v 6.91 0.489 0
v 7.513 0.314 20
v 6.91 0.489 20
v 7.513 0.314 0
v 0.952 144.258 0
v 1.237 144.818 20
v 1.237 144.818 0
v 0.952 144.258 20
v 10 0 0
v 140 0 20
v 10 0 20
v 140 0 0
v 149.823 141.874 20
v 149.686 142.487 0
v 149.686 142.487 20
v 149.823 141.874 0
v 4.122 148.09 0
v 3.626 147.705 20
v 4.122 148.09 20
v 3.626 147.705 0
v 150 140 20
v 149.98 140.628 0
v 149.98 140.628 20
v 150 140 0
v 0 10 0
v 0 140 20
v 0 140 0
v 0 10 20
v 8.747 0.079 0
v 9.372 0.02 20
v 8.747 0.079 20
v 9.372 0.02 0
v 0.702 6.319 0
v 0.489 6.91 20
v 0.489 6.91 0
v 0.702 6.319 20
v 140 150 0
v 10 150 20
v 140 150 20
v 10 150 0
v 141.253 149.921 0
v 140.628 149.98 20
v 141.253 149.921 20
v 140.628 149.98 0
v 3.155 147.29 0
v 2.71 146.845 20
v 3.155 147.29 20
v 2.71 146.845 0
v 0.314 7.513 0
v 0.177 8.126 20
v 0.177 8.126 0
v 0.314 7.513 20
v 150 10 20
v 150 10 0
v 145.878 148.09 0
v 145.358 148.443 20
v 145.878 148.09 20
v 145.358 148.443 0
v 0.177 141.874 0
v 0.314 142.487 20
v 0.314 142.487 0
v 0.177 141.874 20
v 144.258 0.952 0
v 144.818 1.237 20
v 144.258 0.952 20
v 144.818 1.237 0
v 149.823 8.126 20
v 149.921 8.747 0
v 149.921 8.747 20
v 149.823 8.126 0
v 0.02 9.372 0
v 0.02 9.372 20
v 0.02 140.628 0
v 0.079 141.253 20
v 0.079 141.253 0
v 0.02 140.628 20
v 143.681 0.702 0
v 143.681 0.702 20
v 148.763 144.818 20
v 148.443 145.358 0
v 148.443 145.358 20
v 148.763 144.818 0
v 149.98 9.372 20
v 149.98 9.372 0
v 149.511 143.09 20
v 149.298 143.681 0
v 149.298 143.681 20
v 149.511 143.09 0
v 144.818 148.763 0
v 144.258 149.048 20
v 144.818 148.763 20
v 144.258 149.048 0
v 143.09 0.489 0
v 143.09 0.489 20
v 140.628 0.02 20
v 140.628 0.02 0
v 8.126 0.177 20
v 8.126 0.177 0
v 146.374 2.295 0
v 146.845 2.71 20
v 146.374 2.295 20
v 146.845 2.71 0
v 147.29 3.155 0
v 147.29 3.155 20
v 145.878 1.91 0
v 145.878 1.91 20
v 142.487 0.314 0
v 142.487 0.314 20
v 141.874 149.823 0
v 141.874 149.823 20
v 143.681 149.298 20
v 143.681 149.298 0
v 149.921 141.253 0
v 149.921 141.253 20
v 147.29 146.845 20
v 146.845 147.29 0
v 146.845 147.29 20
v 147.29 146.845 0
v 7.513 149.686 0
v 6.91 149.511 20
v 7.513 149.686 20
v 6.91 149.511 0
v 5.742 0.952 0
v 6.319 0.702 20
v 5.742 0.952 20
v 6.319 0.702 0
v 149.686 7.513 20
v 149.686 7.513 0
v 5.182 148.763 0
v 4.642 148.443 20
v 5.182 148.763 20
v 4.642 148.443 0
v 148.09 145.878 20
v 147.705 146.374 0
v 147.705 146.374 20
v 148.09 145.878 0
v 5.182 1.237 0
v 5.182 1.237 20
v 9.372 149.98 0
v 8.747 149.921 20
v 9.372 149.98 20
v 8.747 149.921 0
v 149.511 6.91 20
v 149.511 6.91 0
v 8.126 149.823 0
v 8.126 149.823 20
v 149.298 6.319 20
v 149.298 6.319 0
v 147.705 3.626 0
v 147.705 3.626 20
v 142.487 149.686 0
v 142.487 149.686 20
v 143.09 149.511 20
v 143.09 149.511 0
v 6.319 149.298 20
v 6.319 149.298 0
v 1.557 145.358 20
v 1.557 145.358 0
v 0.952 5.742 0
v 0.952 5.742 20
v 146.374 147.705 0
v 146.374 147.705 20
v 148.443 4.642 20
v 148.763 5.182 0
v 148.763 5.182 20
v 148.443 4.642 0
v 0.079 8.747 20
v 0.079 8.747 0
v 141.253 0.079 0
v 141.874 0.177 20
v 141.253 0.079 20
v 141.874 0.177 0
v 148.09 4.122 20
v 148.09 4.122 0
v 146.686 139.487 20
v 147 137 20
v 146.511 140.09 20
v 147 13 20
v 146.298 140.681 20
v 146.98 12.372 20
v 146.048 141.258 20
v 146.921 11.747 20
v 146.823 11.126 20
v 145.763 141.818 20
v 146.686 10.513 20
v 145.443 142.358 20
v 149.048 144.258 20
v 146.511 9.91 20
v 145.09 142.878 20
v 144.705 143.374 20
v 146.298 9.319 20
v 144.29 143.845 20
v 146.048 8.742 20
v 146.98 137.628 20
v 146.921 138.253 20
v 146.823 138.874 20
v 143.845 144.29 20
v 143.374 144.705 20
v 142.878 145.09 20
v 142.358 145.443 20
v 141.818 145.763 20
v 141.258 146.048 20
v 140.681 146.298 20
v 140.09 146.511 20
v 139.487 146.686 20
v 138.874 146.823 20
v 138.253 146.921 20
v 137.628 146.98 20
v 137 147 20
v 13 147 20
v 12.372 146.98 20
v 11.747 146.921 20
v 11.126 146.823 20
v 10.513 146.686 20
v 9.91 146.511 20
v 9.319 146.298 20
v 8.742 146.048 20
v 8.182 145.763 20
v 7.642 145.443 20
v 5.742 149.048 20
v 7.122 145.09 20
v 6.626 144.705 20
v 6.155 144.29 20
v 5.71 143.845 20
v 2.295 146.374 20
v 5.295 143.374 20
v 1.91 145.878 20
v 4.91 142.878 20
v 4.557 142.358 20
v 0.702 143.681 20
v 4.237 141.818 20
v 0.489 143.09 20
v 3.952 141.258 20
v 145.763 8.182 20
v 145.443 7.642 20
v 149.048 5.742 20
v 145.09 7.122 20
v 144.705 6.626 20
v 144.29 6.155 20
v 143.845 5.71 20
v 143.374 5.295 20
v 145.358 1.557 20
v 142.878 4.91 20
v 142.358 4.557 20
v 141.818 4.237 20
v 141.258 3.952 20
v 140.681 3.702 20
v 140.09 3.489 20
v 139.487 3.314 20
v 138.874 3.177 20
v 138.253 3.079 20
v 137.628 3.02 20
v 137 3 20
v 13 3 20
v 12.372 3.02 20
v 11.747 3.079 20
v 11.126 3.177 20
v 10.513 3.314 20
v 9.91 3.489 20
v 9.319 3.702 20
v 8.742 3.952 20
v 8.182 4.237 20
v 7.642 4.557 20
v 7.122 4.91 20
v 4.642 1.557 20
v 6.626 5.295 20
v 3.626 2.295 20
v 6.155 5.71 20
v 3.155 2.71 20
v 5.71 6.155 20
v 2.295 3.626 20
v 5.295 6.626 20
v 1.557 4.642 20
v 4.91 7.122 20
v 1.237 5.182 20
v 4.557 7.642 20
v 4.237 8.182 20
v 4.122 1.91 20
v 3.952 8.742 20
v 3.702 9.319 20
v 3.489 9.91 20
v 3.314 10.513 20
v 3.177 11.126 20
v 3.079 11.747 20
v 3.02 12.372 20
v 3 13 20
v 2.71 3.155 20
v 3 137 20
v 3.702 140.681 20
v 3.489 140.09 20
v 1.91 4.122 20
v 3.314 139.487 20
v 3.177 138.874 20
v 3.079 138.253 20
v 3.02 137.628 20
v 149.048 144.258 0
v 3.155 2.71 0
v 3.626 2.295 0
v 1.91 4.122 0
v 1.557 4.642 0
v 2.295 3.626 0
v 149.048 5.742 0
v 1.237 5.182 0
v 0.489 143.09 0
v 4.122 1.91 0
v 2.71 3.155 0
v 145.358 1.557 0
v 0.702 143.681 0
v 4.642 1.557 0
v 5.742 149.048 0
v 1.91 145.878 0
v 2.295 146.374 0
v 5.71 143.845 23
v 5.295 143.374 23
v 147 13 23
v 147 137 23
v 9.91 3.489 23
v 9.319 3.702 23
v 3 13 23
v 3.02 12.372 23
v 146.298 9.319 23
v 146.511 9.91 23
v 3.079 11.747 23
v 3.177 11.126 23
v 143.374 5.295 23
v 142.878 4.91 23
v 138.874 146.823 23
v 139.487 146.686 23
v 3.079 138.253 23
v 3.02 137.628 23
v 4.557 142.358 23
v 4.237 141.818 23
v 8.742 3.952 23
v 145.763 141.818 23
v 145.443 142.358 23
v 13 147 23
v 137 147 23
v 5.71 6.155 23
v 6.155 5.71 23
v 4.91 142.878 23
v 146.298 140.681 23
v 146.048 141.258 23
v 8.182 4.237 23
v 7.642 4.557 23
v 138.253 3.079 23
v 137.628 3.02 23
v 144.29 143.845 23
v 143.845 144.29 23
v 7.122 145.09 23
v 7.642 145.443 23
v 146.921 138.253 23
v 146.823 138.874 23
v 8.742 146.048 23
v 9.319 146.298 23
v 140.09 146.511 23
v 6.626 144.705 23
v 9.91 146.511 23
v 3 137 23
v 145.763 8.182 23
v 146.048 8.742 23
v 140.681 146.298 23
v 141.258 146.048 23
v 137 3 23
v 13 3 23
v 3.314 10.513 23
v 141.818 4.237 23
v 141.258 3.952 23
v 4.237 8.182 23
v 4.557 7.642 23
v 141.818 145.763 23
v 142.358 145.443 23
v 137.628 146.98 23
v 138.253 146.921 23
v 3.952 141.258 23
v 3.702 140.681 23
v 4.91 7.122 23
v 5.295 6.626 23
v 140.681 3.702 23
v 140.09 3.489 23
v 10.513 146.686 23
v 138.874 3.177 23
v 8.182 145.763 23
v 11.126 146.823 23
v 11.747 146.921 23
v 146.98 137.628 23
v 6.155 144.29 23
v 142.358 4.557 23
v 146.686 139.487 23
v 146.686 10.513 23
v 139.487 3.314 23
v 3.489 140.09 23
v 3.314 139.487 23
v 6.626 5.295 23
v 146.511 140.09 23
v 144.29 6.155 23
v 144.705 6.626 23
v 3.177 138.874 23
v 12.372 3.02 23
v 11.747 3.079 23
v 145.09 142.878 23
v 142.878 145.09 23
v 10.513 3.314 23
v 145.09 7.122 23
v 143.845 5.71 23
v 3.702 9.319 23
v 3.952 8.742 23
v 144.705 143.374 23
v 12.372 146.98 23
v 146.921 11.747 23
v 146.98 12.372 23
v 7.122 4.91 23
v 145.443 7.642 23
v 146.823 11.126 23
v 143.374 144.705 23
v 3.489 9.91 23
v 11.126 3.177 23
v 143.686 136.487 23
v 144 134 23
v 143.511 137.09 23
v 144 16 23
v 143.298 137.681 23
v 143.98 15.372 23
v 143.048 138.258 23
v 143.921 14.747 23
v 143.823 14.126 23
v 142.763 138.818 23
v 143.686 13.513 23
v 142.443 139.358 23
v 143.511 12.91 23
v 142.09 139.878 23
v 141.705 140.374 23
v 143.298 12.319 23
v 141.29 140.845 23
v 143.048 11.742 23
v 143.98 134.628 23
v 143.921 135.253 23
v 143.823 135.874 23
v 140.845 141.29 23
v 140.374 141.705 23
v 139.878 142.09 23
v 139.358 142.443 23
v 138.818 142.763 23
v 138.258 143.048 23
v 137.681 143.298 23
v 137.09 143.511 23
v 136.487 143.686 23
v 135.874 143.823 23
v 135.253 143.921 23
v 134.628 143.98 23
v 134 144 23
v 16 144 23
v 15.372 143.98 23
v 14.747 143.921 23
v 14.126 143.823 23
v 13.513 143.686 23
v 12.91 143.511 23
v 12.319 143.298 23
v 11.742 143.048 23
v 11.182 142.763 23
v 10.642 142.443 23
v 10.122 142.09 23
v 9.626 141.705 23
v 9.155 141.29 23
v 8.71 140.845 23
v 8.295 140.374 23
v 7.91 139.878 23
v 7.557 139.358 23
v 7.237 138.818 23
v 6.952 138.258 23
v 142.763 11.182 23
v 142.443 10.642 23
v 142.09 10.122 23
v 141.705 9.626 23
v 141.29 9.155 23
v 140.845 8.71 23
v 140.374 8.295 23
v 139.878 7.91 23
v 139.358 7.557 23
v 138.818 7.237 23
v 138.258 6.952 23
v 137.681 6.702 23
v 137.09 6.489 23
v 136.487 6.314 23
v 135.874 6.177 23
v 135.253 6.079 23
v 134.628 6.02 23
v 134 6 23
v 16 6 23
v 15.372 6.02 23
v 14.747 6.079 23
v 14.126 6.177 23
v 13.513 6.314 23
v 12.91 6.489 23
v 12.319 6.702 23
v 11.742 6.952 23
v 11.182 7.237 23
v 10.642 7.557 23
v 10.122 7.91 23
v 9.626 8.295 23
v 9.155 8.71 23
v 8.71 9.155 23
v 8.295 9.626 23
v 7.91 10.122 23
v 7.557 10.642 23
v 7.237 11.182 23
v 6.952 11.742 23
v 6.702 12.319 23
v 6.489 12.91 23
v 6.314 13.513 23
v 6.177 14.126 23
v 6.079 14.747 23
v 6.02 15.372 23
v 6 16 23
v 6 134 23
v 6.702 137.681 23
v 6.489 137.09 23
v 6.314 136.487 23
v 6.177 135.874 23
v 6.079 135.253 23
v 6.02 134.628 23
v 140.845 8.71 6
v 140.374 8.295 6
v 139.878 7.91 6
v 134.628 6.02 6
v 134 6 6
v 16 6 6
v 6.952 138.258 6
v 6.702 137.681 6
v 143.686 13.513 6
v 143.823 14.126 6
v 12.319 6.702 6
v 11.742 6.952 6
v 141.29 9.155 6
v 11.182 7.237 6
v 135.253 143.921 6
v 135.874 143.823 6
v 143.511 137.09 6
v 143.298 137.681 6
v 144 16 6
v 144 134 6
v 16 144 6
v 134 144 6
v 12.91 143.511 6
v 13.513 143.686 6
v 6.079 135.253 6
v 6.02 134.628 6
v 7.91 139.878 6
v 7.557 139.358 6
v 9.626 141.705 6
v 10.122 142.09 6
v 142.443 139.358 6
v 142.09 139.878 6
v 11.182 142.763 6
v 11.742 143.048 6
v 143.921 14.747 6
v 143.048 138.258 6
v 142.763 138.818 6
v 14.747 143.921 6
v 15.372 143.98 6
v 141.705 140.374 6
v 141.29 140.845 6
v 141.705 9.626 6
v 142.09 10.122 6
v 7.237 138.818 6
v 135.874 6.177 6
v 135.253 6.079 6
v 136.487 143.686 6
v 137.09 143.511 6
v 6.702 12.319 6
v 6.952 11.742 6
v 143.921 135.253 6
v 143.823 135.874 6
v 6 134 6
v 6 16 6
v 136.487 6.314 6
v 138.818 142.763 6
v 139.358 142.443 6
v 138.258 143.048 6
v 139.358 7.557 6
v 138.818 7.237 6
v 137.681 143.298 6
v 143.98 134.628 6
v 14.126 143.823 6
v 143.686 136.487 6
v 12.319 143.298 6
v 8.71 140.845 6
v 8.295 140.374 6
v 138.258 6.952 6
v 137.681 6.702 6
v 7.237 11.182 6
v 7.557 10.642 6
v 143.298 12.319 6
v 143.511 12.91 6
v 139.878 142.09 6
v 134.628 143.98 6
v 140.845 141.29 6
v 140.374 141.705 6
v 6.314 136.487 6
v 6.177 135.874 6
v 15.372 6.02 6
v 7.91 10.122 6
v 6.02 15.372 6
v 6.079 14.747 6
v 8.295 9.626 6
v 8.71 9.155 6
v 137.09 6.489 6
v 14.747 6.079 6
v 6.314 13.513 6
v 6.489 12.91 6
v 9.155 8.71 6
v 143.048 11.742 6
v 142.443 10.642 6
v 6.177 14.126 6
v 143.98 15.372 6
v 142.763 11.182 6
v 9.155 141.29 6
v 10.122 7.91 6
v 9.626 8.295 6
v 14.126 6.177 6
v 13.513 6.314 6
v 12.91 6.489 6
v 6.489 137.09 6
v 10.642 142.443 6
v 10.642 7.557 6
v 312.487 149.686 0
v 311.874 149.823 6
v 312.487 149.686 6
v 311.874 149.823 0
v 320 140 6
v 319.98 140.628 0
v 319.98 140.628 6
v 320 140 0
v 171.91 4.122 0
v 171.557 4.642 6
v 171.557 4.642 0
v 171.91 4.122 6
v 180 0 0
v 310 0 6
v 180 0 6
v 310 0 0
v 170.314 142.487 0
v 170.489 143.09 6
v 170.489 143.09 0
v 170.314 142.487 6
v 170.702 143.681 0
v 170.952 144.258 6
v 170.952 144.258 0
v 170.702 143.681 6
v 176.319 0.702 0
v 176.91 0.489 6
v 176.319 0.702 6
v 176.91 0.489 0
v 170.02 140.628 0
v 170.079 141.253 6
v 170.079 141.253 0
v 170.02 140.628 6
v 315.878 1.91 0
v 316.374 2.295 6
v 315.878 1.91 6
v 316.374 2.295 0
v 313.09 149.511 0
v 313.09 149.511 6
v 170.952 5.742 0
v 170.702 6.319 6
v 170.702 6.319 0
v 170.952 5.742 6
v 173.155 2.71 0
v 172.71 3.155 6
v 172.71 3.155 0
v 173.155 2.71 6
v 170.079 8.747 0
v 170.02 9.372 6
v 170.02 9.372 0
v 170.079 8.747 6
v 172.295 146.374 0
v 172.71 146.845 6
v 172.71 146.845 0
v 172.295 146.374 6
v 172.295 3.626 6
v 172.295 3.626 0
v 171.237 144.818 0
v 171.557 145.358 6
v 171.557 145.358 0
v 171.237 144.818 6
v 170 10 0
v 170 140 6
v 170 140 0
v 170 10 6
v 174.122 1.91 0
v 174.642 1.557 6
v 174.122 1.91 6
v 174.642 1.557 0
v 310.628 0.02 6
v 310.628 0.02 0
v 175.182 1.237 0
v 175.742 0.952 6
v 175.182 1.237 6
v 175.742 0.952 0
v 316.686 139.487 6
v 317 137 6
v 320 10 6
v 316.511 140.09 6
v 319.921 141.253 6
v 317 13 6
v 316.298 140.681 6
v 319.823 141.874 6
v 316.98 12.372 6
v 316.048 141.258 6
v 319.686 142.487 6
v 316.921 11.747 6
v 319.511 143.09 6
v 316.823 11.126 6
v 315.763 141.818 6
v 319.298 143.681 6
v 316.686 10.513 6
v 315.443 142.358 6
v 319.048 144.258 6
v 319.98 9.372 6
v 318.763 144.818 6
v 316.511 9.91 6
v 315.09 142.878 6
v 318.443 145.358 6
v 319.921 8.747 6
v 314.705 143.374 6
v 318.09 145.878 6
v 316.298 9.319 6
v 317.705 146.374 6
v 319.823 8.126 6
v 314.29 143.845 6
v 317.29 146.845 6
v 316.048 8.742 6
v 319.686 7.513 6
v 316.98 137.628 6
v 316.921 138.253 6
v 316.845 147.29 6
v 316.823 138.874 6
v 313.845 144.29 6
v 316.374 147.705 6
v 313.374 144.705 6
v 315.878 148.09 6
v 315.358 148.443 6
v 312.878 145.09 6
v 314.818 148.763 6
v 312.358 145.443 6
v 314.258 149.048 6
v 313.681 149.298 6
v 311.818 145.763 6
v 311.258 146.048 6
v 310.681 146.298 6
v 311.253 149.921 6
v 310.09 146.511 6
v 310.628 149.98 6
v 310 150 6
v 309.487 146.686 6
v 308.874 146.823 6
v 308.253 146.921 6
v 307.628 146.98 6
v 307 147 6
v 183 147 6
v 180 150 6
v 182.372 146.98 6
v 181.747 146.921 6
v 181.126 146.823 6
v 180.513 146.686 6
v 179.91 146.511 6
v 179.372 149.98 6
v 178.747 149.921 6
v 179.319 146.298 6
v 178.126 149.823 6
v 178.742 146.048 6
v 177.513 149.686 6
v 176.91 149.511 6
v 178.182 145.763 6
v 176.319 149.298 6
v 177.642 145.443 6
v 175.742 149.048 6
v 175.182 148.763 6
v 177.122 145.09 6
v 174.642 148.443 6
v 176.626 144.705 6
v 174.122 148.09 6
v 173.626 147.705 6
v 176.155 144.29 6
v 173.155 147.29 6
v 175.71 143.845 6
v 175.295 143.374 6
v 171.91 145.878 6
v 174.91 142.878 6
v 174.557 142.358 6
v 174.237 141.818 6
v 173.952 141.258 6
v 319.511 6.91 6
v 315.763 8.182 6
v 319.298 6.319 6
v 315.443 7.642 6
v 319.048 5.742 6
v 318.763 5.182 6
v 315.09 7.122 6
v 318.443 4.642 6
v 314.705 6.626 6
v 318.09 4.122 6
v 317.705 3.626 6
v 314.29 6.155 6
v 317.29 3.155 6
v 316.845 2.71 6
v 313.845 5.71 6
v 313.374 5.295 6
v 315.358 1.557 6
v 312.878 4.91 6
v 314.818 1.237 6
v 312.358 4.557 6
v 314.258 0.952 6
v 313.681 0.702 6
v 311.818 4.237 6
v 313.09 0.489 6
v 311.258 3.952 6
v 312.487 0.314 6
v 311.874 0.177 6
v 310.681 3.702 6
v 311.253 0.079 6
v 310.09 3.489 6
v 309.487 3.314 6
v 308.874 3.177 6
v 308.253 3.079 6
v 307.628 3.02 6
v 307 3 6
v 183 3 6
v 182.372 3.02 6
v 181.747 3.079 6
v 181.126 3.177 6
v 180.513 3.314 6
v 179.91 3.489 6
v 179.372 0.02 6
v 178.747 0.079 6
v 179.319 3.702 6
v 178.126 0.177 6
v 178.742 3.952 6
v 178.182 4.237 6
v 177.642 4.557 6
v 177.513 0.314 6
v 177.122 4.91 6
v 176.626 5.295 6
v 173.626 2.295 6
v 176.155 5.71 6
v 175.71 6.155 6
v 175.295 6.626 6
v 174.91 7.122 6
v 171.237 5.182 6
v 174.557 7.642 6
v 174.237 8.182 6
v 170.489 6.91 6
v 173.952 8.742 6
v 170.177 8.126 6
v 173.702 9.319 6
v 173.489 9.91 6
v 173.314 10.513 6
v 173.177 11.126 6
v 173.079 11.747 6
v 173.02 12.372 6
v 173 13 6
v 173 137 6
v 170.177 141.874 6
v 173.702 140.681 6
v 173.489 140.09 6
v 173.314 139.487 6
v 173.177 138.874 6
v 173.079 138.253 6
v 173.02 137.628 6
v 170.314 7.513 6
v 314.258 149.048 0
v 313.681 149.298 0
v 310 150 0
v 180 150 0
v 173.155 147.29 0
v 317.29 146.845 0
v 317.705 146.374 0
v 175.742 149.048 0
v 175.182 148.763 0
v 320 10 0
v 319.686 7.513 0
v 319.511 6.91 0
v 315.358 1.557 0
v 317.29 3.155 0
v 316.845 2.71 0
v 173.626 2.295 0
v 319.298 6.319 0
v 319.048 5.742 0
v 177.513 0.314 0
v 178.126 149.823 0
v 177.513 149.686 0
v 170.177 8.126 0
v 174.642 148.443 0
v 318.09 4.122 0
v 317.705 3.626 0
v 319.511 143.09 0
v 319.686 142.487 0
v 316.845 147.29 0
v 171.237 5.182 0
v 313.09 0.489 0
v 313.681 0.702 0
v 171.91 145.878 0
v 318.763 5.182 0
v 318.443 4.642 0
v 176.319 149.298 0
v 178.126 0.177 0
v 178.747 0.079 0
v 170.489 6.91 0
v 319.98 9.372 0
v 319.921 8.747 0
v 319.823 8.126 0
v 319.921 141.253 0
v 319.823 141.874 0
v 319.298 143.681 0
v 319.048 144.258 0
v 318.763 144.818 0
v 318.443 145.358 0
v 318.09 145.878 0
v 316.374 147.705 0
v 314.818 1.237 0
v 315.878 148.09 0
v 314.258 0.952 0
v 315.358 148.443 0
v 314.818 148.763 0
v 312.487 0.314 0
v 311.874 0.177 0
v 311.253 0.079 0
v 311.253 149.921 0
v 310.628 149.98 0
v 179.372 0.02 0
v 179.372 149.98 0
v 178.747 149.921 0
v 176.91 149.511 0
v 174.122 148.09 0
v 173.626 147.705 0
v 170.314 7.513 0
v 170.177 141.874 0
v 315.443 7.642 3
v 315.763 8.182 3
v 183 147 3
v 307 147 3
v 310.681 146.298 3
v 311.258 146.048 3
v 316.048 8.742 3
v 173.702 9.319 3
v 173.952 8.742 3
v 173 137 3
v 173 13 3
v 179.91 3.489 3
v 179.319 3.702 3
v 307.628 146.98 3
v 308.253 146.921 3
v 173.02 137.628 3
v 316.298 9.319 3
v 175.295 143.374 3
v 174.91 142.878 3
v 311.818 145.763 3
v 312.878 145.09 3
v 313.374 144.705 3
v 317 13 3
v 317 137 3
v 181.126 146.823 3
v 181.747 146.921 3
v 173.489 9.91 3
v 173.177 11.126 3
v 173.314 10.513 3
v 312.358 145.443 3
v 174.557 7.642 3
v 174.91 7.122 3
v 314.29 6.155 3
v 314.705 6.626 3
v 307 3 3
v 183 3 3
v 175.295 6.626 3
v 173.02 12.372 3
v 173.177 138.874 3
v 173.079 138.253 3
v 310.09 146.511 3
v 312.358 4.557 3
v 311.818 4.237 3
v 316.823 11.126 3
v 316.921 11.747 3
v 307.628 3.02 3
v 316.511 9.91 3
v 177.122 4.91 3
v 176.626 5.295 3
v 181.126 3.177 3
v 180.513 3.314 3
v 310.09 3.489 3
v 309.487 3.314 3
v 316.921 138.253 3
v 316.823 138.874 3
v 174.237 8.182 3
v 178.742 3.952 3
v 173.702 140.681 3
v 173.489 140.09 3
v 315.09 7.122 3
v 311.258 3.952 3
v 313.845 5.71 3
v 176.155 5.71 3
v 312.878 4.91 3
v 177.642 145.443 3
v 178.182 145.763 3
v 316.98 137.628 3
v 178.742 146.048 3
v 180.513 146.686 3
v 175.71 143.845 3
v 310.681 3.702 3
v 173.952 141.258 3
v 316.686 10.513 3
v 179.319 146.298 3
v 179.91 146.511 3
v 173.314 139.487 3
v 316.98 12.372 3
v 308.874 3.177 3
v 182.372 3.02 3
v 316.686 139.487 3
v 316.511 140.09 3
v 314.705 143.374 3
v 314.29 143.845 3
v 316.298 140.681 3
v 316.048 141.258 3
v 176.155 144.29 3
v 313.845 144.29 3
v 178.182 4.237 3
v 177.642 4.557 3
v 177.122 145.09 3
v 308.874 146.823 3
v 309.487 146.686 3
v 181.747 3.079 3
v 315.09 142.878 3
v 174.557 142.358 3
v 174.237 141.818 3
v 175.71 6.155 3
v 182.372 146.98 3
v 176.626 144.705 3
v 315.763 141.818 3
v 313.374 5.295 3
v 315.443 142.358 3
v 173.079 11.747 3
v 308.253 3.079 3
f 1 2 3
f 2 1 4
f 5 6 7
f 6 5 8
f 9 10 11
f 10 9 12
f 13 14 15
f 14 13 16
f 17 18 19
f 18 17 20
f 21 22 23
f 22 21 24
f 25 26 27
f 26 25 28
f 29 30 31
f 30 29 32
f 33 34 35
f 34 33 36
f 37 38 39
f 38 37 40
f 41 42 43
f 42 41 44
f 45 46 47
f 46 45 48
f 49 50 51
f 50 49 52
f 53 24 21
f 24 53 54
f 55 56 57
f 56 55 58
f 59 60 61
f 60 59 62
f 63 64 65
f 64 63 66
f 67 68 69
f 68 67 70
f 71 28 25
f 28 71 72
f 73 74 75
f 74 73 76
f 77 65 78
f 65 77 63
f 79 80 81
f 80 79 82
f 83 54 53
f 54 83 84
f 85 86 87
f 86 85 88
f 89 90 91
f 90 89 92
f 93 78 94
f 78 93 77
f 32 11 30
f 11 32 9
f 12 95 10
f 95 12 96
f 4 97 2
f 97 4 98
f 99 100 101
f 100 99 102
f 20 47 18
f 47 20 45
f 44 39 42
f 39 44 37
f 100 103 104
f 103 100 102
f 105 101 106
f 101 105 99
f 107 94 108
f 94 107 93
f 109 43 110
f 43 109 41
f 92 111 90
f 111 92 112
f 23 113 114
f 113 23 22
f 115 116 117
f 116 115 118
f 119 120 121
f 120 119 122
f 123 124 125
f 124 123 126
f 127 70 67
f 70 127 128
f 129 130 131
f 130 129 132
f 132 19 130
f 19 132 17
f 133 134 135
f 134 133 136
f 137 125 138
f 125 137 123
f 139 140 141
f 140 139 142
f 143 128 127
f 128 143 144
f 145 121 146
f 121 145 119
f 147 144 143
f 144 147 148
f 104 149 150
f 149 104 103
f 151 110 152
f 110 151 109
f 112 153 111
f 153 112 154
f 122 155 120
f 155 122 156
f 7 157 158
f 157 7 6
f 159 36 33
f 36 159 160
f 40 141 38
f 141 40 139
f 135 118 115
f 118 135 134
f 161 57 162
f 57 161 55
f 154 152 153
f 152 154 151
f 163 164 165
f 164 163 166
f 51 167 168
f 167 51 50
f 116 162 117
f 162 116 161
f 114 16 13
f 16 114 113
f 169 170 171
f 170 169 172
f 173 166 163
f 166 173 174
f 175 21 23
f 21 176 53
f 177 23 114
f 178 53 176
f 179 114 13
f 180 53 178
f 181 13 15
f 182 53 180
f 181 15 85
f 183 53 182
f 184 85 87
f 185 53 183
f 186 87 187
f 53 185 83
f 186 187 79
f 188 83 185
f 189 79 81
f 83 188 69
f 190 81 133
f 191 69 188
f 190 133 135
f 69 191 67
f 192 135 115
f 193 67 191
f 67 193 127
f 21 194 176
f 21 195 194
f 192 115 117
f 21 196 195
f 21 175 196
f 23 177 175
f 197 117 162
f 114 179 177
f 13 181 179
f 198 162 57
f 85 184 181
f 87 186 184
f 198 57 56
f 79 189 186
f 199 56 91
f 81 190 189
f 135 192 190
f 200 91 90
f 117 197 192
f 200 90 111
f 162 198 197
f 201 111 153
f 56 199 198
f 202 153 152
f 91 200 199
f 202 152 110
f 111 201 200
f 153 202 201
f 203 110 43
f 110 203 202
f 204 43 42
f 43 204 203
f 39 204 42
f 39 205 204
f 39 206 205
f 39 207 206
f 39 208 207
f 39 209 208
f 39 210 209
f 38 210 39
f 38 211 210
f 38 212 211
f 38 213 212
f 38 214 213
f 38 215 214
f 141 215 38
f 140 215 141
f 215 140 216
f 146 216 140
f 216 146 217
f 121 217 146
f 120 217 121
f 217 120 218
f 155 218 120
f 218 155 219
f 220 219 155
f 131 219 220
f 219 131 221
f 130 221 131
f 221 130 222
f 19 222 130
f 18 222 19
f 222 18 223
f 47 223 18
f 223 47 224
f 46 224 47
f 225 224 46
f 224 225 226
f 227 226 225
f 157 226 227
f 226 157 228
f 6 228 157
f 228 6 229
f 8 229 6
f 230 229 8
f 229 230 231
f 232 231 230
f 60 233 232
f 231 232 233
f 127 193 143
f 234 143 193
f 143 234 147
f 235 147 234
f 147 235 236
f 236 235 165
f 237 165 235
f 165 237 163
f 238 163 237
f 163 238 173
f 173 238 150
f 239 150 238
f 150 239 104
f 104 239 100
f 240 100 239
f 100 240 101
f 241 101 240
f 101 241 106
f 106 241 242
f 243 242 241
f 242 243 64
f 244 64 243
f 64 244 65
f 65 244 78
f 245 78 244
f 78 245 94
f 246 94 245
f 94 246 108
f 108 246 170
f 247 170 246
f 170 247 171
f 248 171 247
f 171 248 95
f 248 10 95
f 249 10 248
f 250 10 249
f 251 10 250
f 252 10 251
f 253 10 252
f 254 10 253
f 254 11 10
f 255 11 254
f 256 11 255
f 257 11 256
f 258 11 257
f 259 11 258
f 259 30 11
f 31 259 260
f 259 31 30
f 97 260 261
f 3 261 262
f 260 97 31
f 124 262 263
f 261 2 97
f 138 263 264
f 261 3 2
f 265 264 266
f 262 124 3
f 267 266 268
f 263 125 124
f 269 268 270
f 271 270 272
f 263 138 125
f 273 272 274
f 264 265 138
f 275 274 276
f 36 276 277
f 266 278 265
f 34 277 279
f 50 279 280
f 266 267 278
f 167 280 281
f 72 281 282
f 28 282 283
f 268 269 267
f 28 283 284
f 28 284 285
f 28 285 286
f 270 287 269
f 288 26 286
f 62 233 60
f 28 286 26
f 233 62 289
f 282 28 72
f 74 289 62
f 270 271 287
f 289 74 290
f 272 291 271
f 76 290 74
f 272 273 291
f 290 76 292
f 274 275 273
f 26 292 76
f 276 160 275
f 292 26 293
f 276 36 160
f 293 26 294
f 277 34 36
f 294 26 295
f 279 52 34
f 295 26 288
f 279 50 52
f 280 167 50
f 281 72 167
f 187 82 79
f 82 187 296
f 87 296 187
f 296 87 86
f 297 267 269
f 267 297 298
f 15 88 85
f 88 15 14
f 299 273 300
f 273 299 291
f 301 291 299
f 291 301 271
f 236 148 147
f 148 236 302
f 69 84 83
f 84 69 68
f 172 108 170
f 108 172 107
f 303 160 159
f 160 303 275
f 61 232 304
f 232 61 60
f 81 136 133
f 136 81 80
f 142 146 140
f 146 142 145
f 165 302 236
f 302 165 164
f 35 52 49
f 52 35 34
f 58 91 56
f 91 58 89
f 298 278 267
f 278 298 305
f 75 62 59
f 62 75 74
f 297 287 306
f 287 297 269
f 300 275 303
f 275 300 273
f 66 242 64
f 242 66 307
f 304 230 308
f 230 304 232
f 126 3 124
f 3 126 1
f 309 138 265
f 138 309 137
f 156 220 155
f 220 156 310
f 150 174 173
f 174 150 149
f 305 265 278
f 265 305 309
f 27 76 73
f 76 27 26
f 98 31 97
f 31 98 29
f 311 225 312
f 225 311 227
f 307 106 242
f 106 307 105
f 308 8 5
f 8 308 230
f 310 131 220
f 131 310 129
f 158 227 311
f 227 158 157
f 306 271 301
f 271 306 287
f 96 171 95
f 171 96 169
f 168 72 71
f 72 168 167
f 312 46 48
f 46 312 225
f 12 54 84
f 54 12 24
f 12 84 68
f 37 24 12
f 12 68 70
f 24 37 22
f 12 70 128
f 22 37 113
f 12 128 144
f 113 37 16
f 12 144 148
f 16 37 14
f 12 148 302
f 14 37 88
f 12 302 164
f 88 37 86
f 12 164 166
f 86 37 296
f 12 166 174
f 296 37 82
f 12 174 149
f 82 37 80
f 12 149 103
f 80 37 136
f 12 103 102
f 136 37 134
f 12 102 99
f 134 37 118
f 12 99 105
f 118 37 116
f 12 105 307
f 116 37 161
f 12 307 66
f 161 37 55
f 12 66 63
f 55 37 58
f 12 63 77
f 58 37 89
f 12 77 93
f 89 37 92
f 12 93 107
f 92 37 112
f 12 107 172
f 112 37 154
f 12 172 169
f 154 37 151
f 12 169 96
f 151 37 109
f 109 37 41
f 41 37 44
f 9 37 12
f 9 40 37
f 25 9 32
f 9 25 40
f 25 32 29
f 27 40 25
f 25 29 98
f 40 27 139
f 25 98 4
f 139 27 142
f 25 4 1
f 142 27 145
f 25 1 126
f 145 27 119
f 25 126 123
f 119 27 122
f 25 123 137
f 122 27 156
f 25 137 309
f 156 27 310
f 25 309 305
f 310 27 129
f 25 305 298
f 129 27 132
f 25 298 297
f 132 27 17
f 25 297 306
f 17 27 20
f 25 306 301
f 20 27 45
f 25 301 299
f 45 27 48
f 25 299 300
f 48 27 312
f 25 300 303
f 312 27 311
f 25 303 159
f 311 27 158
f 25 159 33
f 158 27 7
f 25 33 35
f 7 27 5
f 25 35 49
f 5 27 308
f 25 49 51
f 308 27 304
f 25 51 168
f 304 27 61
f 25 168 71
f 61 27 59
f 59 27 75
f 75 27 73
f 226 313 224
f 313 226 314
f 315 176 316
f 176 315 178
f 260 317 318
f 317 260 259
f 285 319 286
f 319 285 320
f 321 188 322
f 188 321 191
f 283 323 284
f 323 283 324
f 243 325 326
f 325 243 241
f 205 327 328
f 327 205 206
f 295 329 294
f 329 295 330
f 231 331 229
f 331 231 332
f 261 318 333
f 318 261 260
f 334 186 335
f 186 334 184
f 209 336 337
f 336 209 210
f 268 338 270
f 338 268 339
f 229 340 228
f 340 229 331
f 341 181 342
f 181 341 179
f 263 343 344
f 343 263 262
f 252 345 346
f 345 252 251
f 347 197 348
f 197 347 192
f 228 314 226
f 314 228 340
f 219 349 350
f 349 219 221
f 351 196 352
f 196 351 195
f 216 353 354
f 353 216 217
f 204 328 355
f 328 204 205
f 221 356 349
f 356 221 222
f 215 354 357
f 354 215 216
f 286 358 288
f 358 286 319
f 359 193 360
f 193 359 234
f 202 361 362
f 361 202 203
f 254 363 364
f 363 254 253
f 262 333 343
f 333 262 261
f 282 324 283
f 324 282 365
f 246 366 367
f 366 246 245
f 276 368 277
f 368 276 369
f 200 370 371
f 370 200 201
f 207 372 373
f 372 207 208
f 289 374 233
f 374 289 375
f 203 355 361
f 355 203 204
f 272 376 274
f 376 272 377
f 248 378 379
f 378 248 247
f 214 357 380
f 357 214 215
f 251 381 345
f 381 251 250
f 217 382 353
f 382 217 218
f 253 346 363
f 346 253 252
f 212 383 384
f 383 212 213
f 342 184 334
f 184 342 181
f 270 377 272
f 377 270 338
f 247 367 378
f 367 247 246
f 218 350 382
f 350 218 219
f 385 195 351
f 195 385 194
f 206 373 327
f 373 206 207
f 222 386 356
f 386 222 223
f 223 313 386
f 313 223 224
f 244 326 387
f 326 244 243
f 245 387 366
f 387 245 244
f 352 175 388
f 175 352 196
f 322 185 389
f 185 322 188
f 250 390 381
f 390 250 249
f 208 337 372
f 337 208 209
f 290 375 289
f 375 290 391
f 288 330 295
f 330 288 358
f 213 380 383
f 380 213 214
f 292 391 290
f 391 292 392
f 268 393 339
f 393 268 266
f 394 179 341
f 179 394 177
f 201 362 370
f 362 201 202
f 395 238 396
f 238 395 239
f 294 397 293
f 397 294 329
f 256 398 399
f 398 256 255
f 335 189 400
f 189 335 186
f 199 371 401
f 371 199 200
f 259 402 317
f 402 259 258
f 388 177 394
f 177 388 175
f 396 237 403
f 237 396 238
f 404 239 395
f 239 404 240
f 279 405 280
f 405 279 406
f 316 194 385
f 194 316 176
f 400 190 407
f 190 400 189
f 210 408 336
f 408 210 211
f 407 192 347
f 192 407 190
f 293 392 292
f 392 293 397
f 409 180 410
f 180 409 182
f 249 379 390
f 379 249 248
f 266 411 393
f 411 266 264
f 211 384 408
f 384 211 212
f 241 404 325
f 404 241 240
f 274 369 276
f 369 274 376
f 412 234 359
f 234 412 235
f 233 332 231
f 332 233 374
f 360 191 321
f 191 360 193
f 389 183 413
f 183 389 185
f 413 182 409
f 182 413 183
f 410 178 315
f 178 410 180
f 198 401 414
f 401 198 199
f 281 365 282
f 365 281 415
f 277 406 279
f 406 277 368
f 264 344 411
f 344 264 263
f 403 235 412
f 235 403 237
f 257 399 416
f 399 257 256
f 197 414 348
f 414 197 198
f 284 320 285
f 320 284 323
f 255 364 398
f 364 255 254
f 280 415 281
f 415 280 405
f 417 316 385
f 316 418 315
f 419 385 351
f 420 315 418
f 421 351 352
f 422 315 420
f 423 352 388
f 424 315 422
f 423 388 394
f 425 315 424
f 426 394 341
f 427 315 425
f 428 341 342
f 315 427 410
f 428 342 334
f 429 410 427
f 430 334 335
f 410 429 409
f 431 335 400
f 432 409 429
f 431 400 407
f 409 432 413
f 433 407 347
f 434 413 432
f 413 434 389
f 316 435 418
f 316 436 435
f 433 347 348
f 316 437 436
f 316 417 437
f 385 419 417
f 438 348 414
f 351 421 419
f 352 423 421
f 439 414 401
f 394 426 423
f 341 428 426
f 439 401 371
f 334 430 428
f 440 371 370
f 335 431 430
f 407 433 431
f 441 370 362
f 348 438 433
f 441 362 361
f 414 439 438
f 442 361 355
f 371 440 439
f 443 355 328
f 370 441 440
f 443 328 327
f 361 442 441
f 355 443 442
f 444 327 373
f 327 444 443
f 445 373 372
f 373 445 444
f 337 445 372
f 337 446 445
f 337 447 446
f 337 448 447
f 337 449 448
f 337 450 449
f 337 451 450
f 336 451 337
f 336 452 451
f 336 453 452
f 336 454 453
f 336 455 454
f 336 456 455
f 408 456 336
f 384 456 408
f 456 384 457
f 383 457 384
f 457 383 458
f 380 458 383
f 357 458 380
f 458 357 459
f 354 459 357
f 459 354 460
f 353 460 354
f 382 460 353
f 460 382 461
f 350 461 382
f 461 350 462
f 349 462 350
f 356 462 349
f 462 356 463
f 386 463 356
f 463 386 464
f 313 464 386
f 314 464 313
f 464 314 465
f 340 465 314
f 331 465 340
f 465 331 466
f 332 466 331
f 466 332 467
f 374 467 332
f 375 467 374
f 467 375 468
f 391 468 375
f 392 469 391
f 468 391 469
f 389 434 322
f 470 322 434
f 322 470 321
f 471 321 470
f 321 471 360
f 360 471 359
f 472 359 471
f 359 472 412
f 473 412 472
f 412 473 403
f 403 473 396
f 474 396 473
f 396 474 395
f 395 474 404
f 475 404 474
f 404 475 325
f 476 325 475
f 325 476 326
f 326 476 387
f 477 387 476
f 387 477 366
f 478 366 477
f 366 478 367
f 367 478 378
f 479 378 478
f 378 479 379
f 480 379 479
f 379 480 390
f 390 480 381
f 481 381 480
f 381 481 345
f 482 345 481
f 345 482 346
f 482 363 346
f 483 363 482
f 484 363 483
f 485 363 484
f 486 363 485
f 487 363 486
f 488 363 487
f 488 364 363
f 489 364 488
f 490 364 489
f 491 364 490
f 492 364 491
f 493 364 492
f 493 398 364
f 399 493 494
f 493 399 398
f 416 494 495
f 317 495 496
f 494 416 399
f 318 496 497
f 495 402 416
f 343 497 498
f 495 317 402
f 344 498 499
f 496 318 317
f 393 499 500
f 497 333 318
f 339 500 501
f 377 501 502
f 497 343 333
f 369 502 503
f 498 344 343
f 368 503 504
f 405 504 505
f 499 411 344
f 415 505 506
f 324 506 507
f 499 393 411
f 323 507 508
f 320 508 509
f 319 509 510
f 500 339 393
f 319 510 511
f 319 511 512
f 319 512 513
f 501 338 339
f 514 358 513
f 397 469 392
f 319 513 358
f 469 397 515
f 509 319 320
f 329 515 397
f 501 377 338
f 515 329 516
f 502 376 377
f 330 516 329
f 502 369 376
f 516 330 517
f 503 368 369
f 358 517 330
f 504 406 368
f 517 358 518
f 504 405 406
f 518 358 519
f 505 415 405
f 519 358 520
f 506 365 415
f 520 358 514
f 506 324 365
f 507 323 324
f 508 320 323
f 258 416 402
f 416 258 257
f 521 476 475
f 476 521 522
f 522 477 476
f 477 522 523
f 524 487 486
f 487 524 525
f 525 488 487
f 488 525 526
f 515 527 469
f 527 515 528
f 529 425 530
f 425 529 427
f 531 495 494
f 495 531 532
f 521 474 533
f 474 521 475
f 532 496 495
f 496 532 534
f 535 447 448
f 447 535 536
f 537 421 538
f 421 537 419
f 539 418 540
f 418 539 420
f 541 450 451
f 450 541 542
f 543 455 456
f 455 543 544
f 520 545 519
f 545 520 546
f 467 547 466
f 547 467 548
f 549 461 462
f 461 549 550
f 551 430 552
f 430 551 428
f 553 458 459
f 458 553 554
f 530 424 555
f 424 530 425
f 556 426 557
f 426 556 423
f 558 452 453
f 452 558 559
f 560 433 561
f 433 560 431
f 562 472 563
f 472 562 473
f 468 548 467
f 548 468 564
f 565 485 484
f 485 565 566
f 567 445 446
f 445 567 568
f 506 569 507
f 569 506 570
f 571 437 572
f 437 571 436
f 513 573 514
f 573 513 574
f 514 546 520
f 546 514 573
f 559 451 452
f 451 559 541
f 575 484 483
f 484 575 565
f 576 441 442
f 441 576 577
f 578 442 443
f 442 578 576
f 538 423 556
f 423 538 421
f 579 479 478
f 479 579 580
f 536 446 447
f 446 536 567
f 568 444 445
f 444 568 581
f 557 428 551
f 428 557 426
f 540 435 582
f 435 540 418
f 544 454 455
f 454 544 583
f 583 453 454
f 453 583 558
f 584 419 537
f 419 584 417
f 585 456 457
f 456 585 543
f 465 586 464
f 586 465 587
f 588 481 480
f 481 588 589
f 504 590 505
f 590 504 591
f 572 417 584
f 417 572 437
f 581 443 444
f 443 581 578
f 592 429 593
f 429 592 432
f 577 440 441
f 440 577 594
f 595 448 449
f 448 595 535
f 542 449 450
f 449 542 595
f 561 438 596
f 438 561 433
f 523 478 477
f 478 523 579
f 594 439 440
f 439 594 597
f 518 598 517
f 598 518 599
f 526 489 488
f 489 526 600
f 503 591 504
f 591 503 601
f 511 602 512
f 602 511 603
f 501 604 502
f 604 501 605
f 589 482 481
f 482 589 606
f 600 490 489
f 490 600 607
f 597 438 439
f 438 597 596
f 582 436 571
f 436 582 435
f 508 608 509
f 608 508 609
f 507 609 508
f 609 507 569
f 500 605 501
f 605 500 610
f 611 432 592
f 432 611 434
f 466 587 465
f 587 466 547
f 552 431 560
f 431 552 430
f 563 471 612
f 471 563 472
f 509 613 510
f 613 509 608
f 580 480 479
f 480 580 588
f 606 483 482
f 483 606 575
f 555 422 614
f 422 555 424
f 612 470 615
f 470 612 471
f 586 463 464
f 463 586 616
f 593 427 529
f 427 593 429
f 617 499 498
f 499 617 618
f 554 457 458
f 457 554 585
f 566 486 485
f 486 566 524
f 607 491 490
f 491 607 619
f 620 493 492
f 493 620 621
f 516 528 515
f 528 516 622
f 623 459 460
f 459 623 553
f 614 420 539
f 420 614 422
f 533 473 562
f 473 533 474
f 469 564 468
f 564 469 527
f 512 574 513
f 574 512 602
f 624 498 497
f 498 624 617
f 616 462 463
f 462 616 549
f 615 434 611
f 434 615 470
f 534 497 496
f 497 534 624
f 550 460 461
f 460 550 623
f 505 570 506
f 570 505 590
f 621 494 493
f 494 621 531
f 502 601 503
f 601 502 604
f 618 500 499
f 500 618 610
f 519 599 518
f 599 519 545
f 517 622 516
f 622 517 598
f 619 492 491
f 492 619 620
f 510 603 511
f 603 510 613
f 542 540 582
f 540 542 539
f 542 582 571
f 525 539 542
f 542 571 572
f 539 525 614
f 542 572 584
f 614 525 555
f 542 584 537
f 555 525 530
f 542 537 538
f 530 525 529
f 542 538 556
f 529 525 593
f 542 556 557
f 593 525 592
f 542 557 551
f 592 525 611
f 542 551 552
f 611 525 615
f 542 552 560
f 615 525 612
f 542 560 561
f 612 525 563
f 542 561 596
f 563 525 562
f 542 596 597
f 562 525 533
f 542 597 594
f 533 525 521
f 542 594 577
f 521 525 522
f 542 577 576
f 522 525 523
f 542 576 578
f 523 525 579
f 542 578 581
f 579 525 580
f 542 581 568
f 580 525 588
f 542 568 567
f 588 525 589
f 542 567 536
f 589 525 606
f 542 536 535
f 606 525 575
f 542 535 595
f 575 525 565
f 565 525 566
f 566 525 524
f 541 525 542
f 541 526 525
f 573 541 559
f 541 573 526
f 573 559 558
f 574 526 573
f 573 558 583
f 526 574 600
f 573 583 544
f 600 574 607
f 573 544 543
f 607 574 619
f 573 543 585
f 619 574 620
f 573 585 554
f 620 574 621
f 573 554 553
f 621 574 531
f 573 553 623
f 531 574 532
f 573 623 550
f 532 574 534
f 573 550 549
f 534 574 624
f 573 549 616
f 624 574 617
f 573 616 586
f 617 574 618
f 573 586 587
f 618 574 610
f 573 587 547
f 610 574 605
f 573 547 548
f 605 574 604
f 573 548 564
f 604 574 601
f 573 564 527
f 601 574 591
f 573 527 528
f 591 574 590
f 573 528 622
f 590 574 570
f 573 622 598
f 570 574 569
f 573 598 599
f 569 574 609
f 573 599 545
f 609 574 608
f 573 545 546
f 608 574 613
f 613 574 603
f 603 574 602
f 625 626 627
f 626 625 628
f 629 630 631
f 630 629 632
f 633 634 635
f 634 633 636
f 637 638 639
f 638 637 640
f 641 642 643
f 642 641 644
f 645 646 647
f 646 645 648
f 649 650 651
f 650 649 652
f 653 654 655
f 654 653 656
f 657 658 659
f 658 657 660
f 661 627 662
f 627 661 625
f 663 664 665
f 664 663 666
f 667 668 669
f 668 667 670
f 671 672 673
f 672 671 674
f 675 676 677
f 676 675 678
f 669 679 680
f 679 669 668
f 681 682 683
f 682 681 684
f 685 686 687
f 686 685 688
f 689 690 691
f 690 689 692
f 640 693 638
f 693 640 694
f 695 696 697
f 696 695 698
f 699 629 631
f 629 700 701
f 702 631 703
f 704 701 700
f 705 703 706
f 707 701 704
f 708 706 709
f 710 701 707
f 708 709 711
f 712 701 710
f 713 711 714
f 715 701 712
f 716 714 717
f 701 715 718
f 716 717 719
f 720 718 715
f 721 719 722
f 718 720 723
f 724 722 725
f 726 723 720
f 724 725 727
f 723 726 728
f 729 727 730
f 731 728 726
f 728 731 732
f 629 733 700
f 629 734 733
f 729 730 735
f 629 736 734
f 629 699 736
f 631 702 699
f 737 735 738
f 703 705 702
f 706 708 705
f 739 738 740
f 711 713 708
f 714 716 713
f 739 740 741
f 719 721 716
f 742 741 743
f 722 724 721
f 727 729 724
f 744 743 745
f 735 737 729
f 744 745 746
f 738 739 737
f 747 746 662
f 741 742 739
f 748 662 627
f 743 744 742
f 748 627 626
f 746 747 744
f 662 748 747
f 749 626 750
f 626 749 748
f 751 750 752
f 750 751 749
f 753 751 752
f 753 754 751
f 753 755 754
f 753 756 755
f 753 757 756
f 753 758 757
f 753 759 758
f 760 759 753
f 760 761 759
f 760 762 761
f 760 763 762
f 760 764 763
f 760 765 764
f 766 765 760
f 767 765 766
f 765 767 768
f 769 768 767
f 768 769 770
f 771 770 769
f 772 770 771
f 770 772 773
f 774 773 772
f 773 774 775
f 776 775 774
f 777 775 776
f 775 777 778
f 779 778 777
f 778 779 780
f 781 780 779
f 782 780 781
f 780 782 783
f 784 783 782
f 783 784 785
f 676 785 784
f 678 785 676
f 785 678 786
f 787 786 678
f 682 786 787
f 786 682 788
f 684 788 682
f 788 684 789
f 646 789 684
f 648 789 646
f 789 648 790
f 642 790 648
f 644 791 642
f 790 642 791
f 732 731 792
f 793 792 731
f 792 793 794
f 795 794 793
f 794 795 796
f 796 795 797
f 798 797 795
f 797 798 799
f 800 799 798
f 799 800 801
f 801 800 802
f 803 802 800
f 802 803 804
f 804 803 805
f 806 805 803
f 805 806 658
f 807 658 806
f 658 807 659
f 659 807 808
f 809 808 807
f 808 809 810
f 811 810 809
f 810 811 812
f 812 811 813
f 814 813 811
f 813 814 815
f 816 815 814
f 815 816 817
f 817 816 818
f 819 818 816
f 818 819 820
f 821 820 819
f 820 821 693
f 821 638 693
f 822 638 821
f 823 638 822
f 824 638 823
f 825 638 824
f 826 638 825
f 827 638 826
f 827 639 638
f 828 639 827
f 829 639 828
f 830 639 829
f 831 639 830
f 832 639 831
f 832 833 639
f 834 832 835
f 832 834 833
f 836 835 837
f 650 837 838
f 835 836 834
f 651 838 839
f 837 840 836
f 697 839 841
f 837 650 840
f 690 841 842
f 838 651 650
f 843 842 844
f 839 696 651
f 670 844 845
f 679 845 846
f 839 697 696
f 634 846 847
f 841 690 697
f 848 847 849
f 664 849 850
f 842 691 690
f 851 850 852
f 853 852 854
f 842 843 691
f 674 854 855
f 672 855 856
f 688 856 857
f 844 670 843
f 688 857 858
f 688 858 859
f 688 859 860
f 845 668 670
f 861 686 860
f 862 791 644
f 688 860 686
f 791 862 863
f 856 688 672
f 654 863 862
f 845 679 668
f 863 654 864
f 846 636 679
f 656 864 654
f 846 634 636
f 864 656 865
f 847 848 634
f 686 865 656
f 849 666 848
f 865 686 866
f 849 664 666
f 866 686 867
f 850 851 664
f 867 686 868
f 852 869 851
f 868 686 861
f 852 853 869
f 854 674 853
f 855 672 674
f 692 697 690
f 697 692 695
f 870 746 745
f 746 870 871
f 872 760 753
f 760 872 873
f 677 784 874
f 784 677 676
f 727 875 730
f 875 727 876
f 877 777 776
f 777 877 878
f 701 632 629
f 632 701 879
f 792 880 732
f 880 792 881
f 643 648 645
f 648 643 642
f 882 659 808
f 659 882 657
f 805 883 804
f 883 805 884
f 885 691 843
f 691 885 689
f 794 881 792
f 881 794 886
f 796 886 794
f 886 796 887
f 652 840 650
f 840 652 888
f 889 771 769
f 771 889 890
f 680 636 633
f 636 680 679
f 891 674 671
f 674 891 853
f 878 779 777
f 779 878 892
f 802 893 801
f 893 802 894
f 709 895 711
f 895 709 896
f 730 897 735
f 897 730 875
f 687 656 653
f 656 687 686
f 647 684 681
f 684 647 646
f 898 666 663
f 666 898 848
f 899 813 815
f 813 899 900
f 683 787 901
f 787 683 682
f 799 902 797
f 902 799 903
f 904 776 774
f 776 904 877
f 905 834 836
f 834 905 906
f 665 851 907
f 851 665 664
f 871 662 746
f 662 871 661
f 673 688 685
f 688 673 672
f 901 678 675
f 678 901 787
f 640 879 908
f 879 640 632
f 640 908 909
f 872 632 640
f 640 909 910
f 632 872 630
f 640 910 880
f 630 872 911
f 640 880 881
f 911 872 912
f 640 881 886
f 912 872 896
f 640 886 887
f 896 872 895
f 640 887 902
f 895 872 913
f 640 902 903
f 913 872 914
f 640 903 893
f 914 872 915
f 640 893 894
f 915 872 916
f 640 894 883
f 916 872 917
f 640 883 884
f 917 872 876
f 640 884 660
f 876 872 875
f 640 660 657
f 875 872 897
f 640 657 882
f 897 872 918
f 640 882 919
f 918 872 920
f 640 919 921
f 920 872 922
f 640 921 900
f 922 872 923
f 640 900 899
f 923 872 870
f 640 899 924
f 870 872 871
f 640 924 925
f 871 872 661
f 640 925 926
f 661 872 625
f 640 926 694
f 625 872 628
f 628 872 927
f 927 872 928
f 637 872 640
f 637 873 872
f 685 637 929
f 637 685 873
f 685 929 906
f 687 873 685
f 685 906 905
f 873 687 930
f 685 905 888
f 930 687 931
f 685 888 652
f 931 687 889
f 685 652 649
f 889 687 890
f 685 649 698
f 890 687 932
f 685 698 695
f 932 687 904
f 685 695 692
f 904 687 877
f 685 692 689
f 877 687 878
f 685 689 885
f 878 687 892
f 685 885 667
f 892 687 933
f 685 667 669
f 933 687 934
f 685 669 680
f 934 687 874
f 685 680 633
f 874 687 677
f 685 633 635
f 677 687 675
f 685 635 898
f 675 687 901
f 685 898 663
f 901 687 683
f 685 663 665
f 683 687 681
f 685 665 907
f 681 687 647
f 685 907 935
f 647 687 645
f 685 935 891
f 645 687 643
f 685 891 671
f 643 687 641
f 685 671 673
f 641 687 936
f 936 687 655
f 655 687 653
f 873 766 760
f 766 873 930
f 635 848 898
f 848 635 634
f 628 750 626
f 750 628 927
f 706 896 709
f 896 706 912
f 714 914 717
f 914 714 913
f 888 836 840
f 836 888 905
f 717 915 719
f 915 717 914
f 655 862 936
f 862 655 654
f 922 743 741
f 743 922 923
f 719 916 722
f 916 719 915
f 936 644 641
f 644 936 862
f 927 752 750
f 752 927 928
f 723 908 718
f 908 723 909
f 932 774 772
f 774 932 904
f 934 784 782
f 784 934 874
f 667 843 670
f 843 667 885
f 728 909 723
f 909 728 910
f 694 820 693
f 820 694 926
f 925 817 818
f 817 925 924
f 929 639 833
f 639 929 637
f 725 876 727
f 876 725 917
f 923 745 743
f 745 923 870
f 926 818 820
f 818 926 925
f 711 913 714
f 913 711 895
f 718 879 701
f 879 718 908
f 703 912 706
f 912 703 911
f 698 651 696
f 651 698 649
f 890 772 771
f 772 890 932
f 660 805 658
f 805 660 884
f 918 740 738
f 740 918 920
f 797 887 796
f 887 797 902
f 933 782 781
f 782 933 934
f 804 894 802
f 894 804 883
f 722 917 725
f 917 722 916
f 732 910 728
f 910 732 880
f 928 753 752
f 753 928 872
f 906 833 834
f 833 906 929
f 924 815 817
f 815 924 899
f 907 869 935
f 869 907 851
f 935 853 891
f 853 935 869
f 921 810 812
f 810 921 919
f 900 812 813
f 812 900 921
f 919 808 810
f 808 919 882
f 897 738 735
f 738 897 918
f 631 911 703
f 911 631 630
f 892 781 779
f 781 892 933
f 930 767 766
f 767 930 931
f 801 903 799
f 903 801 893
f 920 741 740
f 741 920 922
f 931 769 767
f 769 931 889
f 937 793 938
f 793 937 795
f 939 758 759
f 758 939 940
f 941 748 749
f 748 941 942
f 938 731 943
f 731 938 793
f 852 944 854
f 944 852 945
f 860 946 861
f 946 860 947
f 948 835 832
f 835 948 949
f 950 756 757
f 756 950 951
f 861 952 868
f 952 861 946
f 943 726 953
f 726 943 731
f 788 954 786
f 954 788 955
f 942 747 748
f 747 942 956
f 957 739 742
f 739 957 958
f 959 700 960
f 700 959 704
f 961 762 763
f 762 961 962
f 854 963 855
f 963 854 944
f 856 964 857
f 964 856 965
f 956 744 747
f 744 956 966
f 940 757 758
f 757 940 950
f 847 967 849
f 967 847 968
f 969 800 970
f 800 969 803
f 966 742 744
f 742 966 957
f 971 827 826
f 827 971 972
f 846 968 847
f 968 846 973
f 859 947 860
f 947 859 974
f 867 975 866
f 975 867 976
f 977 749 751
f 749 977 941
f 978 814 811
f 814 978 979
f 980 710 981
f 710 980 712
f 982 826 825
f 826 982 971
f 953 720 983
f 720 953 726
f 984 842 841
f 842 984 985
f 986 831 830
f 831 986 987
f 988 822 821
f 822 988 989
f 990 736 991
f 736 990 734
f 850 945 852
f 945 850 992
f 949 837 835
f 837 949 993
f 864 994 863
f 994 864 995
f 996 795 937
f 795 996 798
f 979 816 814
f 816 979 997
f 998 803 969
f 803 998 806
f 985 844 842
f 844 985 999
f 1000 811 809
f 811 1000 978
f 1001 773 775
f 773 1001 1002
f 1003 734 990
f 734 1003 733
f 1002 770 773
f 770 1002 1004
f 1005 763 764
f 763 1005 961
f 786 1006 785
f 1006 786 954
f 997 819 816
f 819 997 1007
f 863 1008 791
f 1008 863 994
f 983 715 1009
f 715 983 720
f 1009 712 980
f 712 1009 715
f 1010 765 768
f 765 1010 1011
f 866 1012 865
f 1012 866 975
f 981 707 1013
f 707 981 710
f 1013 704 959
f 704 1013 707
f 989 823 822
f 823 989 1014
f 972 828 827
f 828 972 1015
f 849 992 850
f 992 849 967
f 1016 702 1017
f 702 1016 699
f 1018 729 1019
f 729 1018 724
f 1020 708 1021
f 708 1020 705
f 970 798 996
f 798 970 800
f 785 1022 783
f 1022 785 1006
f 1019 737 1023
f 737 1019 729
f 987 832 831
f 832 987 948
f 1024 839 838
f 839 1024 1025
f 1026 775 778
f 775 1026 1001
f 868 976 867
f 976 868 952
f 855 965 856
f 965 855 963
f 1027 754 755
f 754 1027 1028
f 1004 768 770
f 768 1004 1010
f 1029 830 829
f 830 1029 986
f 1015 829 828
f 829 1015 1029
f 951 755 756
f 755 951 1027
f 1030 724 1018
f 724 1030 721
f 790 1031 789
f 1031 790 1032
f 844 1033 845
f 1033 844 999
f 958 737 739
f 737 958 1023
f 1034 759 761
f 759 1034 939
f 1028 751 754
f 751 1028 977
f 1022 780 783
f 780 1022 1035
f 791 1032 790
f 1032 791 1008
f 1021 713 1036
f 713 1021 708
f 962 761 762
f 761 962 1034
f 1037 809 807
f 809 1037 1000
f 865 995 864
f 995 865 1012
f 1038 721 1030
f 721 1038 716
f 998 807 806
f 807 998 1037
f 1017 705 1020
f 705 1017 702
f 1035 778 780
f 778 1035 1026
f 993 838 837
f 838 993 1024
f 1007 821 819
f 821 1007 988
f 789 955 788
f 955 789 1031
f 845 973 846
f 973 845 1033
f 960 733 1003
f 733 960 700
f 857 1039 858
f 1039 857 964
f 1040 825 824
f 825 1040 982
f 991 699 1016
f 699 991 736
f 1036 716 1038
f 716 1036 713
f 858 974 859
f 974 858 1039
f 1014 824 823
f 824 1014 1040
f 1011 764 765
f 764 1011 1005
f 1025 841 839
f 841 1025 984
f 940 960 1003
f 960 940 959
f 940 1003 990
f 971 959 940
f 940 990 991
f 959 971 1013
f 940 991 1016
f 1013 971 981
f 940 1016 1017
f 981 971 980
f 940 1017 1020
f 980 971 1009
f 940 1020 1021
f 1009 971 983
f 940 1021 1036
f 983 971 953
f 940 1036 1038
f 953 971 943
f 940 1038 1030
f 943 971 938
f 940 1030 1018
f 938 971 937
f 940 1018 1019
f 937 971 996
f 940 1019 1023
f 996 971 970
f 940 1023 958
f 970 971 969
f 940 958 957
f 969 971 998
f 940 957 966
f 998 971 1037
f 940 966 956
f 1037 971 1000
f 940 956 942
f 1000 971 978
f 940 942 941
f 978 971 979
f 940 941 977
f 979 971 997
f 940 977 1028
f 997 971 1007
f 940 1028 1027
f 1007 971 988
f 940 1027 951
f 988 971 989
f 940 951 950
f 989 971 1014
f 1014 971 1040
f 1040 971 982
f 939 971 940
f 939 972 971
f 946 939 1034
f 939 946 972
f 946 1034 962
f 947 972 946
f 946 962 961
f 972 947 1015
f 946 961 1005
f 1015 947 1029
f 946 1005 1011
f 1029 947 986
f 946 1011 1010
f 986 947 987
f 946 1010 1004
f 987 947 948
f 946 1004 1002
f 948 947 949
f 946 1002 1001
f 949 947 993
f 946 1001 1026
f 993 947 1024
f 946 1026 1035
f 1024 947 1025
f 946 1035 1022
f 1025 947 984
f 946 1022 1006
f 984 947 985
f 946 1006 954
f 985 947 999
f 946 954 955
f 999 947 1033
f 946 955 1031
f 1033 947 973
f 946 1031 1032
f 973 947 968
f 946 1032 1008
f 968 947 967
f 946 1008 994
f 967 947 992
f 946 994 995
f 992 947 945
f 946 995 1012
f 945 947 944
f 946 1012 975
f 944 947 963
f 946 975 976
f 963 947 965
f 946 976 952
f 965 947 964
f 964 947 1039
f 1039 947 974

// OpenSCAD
buttom(10,20,150,150);
wallthickness = 3;


module form(radius,height, width,length){
    hull(){
    translate([radius,radius,0])
    cylinder(r=radius, h=height, $fn=100);
        
    translate([width-radius,radius,0])
    cylinder(r=radius, h=height, $fn=100);
        
    translate([radius,length-radius,0])
    cylinder(r=radius, h=height, $fn=100);
        
    translate([width-radius,length-radius,0])
    cylinder(r=radius, h=height, $fn=100);
    }
}

module buttom(corner, height,width,length){
    
 difference(){
    union(){
    //outer
    form(corner,height,width,length);  
    //rim
  translate([wallthickness,wallthickness,3])
    form(corner,height,width-wallthickness*2,length-wallthickness*2);
     }
     //inner
       translate([wallthickness*2,wallthickness*2,5+1])
       form(corner,height,width-wallthickness*4,length-wallthickness*4);
   }
   
   difference(){
    translate([width+20,0,0])
    form(corner, 6,width,length);
    translate([width+20+wallthickness,wallthickness,3])
    form(corner,7,width-wallthickness*2,length-wallthickness*2);
    }
}


  
